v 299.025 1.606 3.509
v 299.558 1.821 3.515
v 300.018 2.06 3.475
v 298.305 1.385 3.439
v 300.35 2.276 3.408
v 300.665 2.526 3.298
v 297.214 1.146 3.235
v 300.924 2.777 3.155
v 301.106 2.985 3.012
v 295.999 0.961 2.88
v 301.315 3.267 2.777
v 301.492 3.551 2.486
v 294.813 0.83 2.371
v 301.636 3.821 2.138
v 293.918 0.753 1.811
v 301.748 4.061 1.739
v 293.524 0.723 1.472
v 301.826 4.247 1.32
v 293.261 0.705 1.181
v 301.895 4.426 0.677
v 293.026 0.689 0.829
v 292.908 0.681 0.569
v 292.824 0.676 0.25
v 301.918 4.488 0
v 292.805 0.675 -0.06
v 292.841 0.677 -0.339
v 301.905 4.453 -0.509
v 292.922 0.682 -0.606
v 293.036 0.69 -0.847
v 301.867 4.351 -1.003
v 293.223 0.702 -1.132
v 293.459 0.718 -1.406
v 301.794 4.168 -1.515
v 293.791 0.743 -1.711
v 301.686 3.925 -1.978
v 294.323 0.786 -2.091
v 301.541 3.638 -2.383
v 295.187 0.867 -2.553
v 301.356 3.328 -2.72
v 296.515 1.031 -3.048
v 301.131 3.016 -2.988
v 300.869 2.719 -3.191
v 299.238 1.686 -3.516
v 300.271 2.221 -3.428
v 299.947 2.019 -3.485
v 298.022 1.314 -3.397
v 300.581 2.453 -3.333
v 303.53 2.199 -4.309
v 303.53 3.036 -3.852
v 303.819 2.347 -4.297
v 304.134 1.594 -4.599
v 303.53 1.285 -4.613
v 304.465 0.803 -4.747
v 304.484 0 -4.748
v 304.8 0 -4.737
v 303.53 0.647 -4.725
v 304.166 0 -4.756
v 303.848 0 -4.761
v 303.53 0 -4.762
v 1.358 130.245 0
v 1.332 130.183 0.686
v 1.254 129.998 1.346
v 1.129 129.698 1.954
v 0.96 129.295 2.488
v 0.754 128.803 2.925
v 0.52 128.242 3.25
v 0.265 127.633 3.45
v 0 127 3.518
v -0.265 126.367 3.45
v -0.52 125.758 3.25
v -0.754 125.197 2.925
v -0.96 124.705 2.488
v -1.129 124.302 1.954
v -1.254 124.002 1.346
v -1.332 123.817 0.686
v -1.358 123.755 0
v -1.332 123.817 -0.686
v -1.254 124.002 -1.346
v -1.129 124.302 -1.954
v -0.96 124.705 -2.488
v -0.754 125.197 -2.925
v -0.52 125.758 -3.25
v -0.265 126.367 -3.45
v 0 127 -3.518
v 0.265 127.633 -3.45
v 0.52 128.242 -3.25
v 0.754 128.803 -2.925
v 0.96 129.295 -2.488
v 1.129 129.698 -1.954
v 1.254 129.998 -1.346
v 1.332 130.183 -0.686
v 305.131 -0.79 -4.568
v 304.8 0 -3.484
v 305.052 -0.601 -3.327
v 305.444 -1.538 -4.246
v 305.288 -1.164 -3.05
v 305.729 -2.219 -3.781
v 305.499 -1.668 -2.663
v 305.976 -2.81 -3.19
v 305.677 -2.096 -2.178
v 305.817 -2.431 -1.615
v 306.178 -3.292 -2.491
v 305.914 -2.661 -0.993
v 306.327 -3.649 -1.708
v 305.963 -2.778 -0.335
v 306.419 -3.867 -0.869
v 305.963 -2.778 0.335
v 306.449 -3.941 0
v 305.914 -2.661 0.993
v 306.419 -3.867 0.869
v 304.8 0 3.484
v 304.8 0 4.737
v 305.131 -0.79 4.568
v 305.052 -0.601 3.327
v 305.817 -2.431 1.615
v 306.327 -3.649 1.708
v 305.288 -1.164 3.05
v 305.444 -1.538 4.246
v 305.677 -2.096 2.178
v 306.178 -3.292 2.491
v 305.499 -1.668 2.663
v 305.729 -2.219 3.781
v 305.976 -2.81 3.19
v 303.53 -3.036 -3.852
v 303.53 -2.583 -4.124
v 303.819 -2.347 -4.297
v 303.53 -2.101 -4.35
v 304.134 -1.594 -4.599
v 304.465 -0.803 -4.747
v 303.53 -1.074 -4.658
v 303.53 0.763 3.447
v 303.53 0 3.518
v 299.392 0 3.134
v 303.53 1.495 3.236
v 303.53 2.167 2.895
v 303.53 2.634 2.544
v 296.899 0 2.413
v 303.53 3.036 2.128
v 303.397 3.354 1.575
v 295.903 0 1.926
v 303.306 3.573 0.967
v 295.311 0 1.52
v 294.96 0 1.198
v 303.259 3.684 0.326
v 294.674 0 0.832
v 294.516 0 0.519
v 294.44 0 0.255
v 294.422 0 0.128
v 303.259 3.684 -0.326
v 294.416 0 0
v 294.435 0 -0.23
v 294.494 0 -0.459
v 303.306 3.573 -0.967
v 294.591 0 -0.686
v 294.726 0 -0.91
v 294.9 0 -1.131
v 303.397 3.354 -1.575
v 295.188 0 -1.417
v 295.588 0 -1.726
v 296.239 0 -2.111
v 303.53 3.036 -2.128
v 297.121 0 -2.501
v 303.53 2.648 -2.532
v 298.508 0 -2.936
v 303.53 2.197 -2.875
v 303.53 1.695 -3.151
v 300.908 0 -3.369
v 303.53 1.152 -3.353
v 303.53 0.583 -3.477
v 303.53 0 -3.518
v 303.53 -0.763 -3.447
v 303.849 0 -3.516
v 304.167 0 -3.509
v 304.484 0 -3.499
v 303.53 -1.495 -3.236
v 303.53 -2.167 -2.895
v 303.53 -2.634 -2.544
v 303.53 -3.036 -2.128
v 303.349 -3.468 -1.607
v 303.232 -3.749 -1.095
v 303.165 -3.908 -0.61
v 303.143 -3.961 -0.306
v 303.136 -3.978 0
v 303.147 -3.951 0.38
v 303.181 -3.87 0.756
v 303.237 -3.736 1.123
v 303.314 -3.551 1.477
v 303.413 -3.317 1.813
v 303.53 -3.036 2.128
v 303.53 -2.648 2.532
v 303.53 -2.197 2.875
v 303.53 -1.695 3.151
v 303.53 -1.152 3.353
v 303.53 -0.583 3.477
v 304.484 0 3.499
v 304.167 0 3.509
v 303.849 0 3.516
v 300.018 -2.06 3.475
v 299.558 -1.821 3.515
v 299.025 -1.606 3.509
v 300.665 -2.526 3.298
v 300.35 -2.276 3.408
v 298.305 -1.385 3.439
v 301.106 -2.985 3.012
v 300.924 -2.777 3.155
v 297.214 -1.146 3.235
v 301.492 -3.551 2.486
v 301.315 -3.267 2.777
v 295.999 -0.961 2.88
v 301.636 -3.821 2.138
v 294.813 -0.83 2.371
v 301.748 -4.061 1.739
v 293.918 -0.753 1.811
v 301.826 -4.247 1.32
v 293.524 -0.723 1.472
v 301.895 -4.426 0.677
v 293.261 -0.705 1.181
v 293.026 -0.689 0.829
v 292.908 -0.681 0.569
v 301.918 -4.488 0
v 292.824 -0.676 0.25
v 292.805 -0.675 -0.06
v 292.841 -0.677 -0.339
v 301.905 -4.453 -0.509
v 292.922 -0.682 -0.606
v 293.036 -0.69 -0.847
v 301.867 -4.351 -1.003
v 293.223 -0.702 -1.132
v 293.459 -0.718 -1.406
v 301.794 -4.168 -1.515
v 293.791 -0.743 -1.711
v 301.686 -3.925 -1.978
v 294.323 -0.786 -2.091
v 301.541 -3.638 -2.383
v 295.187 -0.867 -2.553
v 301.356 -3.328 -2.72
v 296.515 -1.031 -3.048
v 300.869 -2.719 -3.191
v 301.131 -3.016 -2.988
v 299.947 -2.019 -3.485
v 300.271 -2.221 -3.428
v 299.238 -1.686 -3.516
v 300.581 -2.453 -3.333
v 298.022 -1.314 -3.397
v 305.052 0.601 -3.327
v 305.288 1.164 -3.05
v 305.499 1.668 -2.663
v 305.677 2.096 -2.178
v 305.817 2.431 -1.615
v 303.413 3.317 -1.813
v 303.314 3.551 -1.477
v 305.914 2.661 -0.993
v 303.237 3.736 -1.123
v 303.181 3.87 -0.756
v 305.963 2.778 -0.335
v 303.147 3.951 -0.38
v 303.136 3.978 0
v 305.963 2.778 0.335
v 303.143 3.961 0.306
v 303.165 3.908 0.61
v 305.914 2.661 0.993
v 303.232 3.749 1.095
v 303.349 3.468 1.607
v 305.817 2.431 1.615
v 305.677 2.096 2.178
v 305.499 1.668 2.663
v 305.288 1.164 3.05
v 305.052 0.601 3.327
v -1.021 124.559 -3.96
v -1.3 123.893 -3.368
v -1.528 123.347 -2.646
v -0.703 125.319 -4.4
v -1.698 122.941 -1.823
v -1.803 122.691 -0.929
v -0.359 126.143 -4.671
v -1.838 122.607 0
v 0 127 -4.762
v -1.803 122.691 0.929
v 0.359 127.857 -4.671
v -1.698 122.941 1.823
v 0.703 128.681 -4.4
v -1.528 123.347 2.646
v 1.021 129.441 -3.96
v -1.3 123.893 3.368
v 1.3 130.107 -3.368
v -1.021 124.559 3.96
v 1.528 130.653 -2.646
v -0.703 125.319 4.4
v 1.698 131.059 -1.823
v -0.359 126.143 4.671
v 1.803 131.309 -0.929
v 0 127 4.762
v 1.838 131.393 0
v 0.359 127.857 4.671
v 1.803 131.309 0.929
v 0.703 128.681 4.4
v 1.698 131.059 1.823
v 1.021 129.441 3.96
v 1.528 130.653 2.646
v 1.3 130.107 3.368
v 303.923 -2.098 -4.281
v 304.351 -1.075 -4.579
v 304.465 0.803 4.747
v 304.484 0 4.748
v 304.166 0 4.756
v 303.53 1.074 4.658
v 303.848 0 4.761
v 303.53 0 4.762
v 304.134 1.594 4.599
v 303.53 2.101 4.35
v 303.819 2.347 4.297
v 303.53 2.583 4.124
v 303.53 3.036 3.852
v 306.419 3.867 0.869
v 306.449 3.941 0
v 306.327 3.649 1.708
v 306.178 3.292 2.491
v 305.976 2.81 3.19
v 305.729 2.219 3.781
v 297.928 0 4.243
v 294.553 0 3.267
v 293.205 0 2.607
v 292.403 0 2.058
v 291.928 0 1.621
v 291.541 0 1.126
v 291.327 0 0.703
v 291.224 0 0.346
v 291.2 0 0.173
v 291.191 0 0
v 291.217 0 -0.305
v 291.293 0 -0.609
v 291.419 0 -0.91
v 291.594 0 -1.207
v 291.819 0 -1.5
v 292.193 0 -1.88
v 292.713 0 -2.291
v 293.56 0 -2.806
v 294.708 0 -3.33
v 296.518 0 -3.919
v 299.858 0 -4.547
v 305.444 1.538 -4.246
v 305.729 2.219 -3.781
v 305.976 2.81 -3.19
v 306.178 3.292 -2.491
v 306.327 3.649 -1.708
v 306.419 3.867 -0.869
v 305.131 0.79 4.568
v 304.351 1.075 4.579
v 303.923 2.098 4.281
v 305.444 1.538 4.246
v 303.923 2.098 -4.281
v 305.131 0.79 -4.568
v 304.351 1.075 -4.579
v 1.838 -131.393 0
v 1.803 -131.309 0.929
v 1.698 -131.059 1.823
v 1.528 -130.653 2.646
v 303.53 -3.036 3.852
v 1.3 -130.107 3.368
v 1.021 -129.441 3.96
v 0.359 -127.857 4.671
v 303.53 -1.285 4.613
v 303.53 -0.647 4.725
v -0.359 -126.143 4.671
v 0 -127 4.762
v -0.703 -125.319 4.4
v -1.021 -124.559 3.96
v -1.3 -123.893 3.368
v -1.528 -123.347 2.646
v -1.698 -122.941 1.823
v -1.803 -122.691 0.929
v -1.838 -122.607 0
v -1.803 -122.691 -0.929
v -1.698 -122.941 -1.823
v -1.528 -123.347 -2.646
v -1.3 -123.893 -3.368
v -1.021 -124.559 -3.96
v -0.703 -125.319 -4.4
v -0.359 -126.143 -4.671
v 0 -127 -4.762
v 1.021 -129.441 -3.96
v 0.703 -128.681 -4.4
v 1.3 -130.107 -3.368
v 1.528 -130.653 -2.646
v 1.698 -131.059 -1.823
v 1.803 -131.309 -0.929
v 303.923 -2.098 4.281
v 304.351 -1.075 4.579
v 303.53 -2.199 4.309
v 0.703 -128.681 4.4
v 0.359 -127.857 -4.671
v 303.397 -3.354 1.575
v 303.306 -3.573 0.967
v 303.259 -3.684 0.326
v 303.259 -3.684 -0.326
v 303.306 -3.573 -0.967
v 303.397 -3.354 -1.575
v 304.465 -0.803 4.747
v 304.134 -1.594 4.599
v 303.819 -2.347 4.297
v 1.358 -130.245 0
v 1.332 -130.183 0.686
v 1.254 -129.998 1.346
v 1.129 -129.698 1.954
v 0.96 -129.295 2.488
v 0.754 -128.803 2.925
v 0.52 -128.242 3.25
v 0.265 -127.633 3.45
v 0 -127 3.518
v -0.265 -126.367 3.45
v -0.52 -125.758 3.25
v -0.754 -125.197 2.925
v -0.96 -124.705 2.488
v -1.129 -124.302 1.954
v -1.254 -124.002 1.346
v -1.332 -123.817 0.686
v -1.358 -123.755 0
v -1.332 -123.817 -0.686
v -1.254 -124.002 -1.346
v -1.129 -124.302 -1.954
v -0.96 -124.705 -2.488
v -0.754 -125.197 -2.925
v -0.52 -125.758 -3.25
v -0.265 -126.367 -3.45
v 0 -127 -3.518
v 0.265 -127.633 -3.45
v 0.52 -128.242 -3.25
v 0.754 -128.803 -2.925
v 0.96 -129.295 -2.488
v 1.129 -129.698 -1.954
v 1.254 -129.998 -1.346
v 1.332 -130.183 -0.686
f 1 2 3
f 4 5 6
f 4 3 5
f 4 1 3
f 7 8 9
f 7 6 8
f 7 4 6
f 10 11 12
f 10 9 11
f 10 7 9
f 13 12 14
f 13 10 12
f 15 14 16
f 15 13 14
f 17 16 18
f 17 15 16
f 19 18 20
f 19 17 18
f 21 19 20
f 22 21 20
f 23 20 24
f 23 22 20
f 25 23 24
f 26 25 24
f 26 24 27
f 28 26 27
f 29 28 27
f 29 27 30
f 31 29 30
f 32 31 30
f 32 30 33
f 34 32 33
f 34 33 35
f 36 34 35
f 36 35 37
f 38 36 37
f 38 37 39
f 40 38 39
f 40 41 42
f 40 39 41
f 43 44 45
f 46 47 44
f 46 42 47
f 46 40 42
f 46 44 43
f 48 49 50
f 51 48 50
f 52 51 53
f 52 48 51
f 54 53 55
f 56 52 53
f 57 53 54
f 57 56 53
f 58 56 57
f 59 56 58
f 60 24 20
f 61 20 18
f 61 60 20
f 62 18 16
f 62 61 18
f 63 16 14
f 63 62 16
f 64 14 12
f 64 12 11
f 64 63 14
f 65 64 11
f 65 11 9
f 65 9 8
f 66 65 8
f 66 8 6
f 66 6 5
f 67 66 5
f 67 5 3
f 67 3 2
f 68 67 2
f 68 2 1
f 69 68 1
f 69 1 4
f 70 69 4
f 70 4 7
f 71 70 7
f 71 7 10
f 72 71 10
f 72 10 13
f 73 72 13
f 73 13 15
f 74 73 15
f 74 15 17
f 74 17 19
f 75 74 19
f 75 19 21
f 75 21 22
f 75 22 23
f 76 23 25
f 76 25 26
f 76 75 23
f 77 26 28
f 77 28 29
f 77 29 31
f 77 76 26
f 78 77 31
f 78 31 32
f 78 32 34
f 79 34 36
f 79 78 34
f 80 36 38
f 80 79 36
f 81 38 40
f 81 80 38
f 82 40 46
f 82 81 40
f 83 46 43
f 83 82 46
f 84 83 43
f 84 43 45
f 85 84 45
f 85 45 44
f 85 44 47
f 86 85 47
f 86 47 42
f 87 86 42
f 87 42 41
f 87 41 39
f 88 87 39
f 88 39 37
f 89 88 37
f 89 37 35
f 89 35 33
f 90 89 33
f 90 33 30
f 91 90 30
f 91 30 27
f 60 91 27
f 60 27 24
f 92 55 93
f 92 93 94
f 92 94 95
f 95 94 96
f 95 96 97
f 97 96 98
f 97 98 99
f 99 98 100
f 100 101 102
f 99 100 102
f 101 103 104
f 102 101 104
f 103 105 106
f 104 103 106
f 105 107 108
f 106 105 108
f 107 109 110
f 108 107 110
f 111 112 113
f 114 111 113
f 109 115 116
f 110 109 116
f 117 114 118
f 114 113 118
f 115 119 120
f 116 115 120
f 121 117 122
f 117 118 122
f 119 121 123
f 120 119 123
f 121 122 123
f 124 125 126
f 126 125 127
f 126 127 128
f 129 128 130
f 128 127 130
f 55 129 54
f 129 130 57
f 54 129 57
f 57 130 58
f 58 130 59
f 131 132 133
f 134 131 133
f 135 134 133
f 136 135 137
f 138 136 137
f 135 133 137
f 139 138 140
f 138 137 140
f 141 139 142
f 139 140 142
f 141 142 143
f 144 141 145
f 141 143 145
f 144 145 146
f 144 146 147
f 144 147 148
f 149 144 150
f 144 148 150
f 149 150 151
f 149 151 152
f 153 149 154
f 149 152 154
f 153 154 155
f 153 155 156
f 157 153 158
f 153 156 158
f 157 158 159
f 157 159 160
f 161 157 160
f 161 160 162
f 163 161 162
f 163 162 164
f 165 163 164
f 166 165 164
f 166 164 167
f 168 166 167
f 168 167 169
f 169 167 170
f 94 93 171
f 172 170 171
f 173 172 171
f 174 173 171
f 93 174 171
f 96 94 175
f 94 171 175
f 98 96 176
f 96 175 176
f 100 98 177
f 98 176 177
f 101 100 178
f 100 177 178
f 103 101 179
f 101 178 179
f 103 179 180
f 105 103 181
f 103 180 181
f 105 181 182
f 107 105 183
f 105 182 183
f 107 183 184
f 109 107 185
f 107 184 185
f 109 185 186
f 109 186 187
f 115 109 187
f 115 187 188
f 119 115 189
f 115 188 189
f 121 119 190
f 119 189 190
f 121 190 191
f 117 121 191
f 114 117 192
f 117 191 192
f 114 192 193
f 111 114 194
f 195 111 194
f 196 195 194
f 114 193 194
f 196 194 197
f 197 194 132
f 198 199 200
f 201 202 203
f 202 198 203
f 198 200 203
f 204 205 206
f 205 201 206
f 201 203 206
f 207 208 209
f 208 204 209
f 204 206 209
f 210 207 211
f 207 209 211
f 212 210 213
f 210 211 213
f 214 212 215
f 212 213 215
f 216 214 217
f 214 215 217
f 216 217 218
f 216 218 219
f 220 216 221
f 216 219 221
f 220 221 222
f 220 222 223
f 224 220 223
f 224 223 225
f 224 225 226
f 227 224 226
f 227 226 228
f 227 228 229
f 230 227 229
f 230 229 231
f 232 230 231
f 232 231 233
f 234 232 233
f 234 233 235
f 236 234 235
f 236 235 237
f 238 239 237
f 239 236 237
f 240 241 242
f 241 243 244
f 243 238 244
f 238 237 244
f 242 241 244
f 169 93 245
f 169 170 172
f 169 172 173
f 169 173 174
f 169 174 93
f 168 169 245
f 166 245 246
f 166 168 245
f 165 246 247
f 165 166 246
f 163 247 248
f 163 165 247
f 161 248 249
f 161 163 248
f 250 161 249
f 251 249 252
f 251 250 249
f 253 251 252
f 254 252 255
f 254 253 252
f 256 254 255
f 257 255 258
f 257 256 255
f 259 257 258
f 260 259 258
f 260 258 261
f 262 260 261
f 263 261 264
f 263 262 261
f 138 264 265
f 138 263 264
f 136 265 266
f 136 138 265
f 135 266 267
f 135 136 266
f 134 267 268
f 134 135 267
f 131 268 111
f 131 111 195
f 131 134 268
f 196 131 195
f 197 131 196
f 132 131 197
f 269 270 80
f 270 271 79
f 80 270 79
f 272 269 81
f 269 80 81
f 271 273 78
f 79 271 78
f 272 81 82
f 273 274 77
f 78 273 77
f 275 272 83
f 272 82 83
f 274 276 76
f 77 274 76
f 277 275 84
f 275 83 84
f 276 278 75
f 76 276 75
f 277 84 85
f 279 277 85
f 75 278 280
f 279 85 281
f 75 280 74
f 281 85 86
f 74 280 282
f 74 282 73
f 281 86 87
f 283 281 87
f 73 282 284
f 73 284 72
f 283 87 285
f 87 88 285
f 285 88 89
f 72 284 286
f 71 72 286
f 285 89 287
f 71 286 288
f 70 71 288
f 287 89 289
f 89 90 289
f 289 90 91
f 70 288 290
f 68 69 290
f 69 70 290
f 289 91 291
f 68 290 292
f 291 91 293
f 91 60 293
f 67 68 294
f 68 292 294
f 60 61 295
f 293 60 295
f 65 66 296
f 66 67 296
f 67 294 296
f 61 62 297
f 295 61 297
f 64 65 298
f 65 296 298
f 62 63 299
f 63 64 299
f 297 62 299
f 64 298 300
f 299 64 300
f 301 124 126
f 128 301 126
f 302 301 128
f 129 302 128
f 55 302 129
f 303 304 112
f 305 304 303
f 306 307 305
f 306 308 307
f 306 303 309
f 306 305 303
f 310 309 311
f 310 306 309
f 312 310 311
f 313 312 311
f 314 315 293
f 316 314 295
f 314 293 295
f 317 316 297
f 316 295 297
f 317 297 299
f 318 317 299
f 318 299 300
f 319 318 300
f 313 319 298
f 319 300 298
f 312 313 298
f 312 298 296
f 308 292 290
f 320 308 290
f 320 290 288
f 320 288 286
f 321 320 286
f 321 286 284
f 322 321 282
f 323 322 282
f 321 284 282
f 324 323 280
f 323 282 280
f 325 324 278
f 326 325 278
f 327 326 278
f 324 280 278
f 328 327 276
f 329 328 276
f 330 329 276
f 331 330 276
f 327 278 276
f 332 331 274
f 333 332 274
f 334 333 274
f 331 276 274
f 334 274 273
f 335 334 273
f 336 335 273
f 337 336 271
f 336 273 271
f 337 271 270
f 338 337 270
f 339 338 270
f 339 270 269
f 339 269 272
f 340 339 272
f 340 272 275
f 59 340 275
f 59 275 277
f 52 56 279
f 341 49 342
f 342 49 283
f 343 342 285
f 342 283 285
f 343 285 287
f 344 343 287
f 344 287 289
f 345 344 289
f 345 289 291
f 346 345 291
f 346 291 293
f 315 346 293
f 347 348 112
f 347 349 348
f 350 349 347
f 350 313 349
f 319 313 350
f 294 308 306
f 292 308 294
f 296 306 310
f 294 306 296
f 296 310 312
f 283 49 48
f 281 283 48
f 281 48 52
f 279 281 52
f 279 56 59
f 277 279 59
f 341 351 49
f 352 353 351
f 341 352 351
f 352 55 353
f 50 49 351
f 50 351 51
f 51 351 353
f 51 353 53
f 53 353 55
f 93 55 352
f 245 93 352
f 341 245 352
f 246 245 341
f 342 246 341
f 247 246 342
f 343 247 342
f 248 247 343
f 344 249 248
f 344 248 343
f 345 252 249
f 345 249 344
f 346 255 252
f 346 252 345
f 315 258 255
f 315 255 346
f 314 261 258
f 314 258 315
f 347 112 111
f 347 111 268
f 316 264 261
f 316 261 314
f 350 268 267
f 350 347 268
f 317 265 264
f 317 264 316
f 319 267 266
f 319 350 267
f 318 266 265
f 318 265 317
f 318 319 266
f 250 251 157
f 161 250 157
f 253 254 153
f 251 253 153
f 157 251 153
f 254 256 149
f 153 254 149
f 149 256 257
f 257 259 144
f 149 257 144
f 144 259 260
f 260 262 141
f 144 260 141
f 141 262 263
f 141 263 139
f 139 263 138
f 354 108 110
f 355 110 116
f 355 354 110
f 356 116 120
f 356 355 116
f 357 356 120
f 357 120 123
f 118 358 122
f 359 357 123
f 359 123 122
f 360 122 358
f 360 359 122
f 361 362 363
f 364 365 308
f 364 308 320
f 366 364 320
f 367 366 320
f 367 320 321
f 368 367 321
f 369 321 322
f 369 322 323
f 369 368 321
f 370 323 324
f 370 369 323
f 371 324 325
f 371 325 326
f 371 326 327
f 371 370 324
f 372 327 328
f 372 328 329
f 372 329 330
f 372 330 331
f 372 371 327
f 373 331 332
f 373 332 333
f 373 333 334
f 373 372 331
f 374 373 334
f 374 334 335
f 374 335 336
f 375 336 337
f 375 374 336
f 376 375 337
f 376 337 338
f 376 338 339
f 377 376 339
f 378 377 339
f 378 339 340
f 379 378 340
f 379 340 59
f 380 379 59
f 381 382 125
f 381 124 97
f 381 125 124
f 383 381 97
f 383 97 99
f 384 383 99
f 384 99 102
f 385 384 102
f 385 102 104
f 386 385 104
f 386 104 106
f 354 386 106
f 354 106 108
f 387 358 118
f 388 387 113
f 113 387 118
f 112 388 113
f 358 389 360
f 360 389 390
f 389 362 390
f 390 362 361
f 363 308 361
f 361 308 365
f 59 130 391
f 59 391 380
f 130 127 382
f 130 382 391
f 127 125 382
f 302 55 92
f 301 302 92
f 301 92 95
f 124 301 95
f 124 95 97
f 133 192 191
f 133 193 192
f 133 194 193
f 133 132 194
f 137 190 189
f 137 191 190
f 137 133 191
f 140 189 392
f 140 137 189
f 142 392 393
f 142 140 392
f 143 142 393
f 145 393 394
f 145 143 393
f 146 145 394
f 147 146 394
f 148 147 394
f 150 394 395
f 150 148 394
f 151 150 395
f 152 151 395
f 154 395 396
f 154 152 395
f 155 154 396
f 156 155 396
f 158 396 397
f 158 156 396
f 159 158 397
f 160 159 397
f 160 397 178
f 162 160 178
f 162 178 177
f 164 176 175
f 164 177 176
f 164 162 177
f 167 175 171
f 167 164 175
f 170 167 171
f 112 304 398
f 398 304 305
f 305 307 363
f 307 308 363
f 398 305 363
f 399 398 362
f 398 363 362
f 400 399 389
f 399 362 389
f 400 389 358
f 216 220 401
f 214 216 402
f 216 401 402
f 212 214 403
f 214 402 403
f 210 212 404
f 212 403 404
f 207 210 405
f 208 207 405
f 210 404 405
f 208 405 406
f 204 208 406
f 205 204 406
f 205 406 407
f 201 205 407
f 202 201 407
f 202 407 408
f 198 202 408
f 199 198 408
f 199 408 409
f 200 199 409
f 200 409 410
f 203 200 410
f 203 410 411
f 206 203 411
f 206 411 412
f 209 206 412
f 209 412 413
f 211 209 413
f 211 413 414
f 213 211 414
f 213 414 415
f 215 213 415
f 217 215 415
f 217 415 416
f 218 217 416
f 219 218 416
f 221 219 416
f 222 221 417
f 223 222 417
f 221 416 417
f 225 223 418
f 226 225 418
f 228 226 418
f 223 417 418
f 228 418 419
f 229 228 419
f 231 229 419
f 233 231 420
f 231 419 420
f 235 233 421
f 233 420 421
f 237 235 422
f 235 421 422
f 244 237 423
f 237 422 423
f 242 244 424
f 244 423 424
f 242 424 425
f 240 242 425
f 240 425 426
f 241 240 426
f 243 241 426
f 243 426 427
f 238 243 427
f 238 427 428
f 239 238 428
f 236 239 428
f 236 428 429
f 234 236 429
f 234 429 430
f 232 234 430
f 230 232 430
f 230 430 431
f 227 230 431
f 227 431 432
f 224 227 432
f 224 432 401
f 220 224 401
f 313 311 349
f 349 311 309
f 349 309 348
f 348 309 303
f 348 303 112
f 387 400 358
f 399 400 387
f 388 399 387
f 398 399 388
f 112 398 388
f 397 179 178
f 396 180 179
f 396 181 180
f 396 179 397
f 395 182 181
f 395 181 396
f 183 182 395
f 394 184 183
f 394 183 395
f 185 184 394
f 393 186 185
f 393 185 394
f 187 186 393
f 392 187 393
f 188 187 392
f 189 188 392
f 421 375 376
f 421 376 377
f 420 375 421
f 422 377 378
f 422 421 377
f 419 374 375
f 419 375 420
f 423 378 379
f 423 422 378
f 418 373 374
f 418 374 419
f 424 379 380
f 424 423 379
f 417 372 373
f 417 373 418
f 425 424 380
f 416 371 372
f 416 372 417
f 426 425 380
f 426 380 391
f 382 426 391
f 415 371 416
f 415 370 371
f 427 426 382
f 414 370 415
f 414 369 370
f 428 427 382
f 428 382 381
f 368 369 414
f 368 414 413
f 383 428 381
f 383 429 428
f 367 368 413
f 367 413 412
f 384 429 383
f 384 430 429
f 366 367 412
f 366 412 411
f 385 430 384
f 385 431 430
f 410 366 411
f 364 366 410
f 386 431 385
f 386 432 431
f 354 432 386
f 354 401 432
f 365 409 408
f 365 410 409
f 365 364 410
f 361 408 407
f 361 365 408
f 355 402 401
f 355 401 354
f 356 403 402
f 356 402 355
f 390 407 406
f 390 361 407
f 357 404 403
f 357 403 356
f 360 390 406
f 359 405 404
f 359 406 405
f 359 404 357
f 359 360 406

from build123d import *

# Parameters (mm, degrees)
F4_R     = 4.7625
F4_R_2   = 3.5179
F5_DEPTH = 330.2


with BuildPart() as f5:
    # F4 (on 3pt) → F5 (new body)
    with BuildSketch(Plane(origin=(-45.2213167265, -18.9210530236, 0), x_dir=(0.3859853229, -0.9225049217, 0), z_dir=(-0.9225049217, -0.3859853229, 0))):
        with Locations((117.1581250533, 0)):
            Circle(F4_R)
        with Locations((117.1581250533, 0)):
            Circle(F4_R_2, mode=Mode.SUBTRACT)
    extrude(amount=-F5_DEPTH)

    # F6: F5 across plane


with BuildPart() as f5_1:
    add(f5.part)
    add(f5.part.mirror(Plane.XZ))


solid = f5_1.part
